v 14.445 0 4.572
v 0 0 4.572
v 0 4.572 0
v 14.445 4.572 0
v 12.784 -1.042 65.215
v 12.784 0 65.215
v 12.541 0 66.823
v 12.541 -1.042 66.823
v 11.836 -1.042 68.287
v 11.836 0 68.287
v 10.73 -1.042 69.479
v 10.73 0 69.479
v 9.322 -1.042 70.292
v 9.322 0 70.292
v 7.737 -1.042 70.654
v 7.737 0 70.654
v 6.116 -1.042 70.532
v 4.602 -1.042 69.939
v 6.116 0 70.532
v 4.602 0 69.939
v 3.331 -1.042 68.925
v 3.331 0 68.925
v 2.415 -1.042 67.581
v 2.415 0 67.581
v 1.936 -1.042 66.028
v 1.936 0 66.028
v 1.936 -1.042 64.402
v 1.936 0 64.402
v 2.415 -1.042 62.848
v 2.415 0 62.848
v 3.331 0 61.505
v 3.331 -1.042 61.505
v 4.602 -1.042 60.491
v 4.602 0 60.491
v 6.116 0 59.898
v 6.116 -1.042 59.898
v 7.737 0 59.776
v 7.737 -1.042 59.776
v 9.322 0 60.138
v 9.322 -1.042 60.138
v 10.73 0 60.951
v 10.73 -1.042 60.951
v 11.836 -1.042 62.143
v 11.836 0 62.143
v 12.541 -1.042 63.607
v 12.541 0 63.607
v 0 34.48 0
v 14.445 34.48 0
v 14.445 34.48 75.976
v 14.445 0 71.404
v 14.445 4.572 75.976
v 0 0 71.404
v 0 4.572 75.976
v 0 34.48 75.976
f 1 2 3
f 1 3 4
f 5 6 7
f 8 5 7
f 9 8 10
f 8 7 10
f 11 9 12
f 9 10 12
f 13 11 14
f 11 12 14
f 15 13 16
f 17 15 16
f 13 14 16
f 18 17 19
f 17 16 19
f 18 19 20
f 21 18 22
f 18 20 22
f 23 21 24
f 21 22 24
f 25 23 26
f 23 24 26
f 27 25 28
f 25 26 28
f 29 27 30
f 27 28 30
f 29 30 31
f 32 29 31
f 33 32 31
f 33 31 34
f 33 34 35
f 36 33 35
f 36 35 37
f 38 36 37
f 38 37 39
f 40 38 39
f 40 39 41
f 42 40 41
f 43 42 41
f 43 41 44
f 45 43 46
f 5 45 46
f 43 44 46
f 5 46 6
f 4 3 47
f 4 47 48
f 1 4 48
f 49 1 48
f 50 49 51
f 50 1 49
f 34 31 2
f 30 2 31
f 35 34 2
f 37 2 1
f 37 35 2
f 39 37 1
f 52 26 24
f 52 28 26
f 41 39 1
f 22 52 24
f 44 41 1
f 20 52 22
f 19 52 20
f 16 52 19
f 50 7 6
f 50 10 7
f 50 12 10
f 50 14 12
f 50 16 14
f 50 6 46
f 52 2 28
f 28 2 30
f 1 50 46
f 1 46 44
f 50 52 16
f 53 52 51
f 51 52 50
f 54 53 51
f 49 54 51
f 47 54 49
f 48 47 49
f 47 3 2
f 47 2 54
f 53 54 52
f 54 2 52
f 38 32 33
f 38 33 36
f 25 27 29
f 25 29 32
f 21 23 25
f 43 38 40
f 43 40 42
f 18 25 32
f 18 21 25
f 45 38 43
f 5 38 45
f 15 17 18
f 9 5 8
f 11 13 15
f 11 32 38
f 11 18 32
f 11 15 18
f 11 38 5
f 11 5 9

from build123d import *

# Parameters (mm, degrees)
F0_W     = 14.444813
F0_H     = 75.975604
F1_DEPTH = 34.479829
F2_R     = 5.454239
F3_DEPTH = 1.041855
F4_SIZE  = 4.572


with BuildPart() as f1:
    # F0 (on Front) → F1 (new body)
    with BuildSketch(Plane.XZ):
        with Locations((7.222406, 37.987802)):
            Rectangle(F0_W, F0_H)
    extrude(amount=-F1_DEPTH)

    # F2 (on face) → F3 (join)
    with BuildSketch(Plane.XZ):
        with Locations((7.329378, 65.214992)):
            Circle(F2_R)
    extrude(amount=F3_DEPTH)

    # F4
    f4_edges = [f1.edges().sort_by_distance(p)[0] for p in [
        (7.222407, 0, 75.975604),
        (7.222407, 0, 0),
    ]]
    chamfer(f4_edges, length=F4_SIZE)


solid = f1.part
